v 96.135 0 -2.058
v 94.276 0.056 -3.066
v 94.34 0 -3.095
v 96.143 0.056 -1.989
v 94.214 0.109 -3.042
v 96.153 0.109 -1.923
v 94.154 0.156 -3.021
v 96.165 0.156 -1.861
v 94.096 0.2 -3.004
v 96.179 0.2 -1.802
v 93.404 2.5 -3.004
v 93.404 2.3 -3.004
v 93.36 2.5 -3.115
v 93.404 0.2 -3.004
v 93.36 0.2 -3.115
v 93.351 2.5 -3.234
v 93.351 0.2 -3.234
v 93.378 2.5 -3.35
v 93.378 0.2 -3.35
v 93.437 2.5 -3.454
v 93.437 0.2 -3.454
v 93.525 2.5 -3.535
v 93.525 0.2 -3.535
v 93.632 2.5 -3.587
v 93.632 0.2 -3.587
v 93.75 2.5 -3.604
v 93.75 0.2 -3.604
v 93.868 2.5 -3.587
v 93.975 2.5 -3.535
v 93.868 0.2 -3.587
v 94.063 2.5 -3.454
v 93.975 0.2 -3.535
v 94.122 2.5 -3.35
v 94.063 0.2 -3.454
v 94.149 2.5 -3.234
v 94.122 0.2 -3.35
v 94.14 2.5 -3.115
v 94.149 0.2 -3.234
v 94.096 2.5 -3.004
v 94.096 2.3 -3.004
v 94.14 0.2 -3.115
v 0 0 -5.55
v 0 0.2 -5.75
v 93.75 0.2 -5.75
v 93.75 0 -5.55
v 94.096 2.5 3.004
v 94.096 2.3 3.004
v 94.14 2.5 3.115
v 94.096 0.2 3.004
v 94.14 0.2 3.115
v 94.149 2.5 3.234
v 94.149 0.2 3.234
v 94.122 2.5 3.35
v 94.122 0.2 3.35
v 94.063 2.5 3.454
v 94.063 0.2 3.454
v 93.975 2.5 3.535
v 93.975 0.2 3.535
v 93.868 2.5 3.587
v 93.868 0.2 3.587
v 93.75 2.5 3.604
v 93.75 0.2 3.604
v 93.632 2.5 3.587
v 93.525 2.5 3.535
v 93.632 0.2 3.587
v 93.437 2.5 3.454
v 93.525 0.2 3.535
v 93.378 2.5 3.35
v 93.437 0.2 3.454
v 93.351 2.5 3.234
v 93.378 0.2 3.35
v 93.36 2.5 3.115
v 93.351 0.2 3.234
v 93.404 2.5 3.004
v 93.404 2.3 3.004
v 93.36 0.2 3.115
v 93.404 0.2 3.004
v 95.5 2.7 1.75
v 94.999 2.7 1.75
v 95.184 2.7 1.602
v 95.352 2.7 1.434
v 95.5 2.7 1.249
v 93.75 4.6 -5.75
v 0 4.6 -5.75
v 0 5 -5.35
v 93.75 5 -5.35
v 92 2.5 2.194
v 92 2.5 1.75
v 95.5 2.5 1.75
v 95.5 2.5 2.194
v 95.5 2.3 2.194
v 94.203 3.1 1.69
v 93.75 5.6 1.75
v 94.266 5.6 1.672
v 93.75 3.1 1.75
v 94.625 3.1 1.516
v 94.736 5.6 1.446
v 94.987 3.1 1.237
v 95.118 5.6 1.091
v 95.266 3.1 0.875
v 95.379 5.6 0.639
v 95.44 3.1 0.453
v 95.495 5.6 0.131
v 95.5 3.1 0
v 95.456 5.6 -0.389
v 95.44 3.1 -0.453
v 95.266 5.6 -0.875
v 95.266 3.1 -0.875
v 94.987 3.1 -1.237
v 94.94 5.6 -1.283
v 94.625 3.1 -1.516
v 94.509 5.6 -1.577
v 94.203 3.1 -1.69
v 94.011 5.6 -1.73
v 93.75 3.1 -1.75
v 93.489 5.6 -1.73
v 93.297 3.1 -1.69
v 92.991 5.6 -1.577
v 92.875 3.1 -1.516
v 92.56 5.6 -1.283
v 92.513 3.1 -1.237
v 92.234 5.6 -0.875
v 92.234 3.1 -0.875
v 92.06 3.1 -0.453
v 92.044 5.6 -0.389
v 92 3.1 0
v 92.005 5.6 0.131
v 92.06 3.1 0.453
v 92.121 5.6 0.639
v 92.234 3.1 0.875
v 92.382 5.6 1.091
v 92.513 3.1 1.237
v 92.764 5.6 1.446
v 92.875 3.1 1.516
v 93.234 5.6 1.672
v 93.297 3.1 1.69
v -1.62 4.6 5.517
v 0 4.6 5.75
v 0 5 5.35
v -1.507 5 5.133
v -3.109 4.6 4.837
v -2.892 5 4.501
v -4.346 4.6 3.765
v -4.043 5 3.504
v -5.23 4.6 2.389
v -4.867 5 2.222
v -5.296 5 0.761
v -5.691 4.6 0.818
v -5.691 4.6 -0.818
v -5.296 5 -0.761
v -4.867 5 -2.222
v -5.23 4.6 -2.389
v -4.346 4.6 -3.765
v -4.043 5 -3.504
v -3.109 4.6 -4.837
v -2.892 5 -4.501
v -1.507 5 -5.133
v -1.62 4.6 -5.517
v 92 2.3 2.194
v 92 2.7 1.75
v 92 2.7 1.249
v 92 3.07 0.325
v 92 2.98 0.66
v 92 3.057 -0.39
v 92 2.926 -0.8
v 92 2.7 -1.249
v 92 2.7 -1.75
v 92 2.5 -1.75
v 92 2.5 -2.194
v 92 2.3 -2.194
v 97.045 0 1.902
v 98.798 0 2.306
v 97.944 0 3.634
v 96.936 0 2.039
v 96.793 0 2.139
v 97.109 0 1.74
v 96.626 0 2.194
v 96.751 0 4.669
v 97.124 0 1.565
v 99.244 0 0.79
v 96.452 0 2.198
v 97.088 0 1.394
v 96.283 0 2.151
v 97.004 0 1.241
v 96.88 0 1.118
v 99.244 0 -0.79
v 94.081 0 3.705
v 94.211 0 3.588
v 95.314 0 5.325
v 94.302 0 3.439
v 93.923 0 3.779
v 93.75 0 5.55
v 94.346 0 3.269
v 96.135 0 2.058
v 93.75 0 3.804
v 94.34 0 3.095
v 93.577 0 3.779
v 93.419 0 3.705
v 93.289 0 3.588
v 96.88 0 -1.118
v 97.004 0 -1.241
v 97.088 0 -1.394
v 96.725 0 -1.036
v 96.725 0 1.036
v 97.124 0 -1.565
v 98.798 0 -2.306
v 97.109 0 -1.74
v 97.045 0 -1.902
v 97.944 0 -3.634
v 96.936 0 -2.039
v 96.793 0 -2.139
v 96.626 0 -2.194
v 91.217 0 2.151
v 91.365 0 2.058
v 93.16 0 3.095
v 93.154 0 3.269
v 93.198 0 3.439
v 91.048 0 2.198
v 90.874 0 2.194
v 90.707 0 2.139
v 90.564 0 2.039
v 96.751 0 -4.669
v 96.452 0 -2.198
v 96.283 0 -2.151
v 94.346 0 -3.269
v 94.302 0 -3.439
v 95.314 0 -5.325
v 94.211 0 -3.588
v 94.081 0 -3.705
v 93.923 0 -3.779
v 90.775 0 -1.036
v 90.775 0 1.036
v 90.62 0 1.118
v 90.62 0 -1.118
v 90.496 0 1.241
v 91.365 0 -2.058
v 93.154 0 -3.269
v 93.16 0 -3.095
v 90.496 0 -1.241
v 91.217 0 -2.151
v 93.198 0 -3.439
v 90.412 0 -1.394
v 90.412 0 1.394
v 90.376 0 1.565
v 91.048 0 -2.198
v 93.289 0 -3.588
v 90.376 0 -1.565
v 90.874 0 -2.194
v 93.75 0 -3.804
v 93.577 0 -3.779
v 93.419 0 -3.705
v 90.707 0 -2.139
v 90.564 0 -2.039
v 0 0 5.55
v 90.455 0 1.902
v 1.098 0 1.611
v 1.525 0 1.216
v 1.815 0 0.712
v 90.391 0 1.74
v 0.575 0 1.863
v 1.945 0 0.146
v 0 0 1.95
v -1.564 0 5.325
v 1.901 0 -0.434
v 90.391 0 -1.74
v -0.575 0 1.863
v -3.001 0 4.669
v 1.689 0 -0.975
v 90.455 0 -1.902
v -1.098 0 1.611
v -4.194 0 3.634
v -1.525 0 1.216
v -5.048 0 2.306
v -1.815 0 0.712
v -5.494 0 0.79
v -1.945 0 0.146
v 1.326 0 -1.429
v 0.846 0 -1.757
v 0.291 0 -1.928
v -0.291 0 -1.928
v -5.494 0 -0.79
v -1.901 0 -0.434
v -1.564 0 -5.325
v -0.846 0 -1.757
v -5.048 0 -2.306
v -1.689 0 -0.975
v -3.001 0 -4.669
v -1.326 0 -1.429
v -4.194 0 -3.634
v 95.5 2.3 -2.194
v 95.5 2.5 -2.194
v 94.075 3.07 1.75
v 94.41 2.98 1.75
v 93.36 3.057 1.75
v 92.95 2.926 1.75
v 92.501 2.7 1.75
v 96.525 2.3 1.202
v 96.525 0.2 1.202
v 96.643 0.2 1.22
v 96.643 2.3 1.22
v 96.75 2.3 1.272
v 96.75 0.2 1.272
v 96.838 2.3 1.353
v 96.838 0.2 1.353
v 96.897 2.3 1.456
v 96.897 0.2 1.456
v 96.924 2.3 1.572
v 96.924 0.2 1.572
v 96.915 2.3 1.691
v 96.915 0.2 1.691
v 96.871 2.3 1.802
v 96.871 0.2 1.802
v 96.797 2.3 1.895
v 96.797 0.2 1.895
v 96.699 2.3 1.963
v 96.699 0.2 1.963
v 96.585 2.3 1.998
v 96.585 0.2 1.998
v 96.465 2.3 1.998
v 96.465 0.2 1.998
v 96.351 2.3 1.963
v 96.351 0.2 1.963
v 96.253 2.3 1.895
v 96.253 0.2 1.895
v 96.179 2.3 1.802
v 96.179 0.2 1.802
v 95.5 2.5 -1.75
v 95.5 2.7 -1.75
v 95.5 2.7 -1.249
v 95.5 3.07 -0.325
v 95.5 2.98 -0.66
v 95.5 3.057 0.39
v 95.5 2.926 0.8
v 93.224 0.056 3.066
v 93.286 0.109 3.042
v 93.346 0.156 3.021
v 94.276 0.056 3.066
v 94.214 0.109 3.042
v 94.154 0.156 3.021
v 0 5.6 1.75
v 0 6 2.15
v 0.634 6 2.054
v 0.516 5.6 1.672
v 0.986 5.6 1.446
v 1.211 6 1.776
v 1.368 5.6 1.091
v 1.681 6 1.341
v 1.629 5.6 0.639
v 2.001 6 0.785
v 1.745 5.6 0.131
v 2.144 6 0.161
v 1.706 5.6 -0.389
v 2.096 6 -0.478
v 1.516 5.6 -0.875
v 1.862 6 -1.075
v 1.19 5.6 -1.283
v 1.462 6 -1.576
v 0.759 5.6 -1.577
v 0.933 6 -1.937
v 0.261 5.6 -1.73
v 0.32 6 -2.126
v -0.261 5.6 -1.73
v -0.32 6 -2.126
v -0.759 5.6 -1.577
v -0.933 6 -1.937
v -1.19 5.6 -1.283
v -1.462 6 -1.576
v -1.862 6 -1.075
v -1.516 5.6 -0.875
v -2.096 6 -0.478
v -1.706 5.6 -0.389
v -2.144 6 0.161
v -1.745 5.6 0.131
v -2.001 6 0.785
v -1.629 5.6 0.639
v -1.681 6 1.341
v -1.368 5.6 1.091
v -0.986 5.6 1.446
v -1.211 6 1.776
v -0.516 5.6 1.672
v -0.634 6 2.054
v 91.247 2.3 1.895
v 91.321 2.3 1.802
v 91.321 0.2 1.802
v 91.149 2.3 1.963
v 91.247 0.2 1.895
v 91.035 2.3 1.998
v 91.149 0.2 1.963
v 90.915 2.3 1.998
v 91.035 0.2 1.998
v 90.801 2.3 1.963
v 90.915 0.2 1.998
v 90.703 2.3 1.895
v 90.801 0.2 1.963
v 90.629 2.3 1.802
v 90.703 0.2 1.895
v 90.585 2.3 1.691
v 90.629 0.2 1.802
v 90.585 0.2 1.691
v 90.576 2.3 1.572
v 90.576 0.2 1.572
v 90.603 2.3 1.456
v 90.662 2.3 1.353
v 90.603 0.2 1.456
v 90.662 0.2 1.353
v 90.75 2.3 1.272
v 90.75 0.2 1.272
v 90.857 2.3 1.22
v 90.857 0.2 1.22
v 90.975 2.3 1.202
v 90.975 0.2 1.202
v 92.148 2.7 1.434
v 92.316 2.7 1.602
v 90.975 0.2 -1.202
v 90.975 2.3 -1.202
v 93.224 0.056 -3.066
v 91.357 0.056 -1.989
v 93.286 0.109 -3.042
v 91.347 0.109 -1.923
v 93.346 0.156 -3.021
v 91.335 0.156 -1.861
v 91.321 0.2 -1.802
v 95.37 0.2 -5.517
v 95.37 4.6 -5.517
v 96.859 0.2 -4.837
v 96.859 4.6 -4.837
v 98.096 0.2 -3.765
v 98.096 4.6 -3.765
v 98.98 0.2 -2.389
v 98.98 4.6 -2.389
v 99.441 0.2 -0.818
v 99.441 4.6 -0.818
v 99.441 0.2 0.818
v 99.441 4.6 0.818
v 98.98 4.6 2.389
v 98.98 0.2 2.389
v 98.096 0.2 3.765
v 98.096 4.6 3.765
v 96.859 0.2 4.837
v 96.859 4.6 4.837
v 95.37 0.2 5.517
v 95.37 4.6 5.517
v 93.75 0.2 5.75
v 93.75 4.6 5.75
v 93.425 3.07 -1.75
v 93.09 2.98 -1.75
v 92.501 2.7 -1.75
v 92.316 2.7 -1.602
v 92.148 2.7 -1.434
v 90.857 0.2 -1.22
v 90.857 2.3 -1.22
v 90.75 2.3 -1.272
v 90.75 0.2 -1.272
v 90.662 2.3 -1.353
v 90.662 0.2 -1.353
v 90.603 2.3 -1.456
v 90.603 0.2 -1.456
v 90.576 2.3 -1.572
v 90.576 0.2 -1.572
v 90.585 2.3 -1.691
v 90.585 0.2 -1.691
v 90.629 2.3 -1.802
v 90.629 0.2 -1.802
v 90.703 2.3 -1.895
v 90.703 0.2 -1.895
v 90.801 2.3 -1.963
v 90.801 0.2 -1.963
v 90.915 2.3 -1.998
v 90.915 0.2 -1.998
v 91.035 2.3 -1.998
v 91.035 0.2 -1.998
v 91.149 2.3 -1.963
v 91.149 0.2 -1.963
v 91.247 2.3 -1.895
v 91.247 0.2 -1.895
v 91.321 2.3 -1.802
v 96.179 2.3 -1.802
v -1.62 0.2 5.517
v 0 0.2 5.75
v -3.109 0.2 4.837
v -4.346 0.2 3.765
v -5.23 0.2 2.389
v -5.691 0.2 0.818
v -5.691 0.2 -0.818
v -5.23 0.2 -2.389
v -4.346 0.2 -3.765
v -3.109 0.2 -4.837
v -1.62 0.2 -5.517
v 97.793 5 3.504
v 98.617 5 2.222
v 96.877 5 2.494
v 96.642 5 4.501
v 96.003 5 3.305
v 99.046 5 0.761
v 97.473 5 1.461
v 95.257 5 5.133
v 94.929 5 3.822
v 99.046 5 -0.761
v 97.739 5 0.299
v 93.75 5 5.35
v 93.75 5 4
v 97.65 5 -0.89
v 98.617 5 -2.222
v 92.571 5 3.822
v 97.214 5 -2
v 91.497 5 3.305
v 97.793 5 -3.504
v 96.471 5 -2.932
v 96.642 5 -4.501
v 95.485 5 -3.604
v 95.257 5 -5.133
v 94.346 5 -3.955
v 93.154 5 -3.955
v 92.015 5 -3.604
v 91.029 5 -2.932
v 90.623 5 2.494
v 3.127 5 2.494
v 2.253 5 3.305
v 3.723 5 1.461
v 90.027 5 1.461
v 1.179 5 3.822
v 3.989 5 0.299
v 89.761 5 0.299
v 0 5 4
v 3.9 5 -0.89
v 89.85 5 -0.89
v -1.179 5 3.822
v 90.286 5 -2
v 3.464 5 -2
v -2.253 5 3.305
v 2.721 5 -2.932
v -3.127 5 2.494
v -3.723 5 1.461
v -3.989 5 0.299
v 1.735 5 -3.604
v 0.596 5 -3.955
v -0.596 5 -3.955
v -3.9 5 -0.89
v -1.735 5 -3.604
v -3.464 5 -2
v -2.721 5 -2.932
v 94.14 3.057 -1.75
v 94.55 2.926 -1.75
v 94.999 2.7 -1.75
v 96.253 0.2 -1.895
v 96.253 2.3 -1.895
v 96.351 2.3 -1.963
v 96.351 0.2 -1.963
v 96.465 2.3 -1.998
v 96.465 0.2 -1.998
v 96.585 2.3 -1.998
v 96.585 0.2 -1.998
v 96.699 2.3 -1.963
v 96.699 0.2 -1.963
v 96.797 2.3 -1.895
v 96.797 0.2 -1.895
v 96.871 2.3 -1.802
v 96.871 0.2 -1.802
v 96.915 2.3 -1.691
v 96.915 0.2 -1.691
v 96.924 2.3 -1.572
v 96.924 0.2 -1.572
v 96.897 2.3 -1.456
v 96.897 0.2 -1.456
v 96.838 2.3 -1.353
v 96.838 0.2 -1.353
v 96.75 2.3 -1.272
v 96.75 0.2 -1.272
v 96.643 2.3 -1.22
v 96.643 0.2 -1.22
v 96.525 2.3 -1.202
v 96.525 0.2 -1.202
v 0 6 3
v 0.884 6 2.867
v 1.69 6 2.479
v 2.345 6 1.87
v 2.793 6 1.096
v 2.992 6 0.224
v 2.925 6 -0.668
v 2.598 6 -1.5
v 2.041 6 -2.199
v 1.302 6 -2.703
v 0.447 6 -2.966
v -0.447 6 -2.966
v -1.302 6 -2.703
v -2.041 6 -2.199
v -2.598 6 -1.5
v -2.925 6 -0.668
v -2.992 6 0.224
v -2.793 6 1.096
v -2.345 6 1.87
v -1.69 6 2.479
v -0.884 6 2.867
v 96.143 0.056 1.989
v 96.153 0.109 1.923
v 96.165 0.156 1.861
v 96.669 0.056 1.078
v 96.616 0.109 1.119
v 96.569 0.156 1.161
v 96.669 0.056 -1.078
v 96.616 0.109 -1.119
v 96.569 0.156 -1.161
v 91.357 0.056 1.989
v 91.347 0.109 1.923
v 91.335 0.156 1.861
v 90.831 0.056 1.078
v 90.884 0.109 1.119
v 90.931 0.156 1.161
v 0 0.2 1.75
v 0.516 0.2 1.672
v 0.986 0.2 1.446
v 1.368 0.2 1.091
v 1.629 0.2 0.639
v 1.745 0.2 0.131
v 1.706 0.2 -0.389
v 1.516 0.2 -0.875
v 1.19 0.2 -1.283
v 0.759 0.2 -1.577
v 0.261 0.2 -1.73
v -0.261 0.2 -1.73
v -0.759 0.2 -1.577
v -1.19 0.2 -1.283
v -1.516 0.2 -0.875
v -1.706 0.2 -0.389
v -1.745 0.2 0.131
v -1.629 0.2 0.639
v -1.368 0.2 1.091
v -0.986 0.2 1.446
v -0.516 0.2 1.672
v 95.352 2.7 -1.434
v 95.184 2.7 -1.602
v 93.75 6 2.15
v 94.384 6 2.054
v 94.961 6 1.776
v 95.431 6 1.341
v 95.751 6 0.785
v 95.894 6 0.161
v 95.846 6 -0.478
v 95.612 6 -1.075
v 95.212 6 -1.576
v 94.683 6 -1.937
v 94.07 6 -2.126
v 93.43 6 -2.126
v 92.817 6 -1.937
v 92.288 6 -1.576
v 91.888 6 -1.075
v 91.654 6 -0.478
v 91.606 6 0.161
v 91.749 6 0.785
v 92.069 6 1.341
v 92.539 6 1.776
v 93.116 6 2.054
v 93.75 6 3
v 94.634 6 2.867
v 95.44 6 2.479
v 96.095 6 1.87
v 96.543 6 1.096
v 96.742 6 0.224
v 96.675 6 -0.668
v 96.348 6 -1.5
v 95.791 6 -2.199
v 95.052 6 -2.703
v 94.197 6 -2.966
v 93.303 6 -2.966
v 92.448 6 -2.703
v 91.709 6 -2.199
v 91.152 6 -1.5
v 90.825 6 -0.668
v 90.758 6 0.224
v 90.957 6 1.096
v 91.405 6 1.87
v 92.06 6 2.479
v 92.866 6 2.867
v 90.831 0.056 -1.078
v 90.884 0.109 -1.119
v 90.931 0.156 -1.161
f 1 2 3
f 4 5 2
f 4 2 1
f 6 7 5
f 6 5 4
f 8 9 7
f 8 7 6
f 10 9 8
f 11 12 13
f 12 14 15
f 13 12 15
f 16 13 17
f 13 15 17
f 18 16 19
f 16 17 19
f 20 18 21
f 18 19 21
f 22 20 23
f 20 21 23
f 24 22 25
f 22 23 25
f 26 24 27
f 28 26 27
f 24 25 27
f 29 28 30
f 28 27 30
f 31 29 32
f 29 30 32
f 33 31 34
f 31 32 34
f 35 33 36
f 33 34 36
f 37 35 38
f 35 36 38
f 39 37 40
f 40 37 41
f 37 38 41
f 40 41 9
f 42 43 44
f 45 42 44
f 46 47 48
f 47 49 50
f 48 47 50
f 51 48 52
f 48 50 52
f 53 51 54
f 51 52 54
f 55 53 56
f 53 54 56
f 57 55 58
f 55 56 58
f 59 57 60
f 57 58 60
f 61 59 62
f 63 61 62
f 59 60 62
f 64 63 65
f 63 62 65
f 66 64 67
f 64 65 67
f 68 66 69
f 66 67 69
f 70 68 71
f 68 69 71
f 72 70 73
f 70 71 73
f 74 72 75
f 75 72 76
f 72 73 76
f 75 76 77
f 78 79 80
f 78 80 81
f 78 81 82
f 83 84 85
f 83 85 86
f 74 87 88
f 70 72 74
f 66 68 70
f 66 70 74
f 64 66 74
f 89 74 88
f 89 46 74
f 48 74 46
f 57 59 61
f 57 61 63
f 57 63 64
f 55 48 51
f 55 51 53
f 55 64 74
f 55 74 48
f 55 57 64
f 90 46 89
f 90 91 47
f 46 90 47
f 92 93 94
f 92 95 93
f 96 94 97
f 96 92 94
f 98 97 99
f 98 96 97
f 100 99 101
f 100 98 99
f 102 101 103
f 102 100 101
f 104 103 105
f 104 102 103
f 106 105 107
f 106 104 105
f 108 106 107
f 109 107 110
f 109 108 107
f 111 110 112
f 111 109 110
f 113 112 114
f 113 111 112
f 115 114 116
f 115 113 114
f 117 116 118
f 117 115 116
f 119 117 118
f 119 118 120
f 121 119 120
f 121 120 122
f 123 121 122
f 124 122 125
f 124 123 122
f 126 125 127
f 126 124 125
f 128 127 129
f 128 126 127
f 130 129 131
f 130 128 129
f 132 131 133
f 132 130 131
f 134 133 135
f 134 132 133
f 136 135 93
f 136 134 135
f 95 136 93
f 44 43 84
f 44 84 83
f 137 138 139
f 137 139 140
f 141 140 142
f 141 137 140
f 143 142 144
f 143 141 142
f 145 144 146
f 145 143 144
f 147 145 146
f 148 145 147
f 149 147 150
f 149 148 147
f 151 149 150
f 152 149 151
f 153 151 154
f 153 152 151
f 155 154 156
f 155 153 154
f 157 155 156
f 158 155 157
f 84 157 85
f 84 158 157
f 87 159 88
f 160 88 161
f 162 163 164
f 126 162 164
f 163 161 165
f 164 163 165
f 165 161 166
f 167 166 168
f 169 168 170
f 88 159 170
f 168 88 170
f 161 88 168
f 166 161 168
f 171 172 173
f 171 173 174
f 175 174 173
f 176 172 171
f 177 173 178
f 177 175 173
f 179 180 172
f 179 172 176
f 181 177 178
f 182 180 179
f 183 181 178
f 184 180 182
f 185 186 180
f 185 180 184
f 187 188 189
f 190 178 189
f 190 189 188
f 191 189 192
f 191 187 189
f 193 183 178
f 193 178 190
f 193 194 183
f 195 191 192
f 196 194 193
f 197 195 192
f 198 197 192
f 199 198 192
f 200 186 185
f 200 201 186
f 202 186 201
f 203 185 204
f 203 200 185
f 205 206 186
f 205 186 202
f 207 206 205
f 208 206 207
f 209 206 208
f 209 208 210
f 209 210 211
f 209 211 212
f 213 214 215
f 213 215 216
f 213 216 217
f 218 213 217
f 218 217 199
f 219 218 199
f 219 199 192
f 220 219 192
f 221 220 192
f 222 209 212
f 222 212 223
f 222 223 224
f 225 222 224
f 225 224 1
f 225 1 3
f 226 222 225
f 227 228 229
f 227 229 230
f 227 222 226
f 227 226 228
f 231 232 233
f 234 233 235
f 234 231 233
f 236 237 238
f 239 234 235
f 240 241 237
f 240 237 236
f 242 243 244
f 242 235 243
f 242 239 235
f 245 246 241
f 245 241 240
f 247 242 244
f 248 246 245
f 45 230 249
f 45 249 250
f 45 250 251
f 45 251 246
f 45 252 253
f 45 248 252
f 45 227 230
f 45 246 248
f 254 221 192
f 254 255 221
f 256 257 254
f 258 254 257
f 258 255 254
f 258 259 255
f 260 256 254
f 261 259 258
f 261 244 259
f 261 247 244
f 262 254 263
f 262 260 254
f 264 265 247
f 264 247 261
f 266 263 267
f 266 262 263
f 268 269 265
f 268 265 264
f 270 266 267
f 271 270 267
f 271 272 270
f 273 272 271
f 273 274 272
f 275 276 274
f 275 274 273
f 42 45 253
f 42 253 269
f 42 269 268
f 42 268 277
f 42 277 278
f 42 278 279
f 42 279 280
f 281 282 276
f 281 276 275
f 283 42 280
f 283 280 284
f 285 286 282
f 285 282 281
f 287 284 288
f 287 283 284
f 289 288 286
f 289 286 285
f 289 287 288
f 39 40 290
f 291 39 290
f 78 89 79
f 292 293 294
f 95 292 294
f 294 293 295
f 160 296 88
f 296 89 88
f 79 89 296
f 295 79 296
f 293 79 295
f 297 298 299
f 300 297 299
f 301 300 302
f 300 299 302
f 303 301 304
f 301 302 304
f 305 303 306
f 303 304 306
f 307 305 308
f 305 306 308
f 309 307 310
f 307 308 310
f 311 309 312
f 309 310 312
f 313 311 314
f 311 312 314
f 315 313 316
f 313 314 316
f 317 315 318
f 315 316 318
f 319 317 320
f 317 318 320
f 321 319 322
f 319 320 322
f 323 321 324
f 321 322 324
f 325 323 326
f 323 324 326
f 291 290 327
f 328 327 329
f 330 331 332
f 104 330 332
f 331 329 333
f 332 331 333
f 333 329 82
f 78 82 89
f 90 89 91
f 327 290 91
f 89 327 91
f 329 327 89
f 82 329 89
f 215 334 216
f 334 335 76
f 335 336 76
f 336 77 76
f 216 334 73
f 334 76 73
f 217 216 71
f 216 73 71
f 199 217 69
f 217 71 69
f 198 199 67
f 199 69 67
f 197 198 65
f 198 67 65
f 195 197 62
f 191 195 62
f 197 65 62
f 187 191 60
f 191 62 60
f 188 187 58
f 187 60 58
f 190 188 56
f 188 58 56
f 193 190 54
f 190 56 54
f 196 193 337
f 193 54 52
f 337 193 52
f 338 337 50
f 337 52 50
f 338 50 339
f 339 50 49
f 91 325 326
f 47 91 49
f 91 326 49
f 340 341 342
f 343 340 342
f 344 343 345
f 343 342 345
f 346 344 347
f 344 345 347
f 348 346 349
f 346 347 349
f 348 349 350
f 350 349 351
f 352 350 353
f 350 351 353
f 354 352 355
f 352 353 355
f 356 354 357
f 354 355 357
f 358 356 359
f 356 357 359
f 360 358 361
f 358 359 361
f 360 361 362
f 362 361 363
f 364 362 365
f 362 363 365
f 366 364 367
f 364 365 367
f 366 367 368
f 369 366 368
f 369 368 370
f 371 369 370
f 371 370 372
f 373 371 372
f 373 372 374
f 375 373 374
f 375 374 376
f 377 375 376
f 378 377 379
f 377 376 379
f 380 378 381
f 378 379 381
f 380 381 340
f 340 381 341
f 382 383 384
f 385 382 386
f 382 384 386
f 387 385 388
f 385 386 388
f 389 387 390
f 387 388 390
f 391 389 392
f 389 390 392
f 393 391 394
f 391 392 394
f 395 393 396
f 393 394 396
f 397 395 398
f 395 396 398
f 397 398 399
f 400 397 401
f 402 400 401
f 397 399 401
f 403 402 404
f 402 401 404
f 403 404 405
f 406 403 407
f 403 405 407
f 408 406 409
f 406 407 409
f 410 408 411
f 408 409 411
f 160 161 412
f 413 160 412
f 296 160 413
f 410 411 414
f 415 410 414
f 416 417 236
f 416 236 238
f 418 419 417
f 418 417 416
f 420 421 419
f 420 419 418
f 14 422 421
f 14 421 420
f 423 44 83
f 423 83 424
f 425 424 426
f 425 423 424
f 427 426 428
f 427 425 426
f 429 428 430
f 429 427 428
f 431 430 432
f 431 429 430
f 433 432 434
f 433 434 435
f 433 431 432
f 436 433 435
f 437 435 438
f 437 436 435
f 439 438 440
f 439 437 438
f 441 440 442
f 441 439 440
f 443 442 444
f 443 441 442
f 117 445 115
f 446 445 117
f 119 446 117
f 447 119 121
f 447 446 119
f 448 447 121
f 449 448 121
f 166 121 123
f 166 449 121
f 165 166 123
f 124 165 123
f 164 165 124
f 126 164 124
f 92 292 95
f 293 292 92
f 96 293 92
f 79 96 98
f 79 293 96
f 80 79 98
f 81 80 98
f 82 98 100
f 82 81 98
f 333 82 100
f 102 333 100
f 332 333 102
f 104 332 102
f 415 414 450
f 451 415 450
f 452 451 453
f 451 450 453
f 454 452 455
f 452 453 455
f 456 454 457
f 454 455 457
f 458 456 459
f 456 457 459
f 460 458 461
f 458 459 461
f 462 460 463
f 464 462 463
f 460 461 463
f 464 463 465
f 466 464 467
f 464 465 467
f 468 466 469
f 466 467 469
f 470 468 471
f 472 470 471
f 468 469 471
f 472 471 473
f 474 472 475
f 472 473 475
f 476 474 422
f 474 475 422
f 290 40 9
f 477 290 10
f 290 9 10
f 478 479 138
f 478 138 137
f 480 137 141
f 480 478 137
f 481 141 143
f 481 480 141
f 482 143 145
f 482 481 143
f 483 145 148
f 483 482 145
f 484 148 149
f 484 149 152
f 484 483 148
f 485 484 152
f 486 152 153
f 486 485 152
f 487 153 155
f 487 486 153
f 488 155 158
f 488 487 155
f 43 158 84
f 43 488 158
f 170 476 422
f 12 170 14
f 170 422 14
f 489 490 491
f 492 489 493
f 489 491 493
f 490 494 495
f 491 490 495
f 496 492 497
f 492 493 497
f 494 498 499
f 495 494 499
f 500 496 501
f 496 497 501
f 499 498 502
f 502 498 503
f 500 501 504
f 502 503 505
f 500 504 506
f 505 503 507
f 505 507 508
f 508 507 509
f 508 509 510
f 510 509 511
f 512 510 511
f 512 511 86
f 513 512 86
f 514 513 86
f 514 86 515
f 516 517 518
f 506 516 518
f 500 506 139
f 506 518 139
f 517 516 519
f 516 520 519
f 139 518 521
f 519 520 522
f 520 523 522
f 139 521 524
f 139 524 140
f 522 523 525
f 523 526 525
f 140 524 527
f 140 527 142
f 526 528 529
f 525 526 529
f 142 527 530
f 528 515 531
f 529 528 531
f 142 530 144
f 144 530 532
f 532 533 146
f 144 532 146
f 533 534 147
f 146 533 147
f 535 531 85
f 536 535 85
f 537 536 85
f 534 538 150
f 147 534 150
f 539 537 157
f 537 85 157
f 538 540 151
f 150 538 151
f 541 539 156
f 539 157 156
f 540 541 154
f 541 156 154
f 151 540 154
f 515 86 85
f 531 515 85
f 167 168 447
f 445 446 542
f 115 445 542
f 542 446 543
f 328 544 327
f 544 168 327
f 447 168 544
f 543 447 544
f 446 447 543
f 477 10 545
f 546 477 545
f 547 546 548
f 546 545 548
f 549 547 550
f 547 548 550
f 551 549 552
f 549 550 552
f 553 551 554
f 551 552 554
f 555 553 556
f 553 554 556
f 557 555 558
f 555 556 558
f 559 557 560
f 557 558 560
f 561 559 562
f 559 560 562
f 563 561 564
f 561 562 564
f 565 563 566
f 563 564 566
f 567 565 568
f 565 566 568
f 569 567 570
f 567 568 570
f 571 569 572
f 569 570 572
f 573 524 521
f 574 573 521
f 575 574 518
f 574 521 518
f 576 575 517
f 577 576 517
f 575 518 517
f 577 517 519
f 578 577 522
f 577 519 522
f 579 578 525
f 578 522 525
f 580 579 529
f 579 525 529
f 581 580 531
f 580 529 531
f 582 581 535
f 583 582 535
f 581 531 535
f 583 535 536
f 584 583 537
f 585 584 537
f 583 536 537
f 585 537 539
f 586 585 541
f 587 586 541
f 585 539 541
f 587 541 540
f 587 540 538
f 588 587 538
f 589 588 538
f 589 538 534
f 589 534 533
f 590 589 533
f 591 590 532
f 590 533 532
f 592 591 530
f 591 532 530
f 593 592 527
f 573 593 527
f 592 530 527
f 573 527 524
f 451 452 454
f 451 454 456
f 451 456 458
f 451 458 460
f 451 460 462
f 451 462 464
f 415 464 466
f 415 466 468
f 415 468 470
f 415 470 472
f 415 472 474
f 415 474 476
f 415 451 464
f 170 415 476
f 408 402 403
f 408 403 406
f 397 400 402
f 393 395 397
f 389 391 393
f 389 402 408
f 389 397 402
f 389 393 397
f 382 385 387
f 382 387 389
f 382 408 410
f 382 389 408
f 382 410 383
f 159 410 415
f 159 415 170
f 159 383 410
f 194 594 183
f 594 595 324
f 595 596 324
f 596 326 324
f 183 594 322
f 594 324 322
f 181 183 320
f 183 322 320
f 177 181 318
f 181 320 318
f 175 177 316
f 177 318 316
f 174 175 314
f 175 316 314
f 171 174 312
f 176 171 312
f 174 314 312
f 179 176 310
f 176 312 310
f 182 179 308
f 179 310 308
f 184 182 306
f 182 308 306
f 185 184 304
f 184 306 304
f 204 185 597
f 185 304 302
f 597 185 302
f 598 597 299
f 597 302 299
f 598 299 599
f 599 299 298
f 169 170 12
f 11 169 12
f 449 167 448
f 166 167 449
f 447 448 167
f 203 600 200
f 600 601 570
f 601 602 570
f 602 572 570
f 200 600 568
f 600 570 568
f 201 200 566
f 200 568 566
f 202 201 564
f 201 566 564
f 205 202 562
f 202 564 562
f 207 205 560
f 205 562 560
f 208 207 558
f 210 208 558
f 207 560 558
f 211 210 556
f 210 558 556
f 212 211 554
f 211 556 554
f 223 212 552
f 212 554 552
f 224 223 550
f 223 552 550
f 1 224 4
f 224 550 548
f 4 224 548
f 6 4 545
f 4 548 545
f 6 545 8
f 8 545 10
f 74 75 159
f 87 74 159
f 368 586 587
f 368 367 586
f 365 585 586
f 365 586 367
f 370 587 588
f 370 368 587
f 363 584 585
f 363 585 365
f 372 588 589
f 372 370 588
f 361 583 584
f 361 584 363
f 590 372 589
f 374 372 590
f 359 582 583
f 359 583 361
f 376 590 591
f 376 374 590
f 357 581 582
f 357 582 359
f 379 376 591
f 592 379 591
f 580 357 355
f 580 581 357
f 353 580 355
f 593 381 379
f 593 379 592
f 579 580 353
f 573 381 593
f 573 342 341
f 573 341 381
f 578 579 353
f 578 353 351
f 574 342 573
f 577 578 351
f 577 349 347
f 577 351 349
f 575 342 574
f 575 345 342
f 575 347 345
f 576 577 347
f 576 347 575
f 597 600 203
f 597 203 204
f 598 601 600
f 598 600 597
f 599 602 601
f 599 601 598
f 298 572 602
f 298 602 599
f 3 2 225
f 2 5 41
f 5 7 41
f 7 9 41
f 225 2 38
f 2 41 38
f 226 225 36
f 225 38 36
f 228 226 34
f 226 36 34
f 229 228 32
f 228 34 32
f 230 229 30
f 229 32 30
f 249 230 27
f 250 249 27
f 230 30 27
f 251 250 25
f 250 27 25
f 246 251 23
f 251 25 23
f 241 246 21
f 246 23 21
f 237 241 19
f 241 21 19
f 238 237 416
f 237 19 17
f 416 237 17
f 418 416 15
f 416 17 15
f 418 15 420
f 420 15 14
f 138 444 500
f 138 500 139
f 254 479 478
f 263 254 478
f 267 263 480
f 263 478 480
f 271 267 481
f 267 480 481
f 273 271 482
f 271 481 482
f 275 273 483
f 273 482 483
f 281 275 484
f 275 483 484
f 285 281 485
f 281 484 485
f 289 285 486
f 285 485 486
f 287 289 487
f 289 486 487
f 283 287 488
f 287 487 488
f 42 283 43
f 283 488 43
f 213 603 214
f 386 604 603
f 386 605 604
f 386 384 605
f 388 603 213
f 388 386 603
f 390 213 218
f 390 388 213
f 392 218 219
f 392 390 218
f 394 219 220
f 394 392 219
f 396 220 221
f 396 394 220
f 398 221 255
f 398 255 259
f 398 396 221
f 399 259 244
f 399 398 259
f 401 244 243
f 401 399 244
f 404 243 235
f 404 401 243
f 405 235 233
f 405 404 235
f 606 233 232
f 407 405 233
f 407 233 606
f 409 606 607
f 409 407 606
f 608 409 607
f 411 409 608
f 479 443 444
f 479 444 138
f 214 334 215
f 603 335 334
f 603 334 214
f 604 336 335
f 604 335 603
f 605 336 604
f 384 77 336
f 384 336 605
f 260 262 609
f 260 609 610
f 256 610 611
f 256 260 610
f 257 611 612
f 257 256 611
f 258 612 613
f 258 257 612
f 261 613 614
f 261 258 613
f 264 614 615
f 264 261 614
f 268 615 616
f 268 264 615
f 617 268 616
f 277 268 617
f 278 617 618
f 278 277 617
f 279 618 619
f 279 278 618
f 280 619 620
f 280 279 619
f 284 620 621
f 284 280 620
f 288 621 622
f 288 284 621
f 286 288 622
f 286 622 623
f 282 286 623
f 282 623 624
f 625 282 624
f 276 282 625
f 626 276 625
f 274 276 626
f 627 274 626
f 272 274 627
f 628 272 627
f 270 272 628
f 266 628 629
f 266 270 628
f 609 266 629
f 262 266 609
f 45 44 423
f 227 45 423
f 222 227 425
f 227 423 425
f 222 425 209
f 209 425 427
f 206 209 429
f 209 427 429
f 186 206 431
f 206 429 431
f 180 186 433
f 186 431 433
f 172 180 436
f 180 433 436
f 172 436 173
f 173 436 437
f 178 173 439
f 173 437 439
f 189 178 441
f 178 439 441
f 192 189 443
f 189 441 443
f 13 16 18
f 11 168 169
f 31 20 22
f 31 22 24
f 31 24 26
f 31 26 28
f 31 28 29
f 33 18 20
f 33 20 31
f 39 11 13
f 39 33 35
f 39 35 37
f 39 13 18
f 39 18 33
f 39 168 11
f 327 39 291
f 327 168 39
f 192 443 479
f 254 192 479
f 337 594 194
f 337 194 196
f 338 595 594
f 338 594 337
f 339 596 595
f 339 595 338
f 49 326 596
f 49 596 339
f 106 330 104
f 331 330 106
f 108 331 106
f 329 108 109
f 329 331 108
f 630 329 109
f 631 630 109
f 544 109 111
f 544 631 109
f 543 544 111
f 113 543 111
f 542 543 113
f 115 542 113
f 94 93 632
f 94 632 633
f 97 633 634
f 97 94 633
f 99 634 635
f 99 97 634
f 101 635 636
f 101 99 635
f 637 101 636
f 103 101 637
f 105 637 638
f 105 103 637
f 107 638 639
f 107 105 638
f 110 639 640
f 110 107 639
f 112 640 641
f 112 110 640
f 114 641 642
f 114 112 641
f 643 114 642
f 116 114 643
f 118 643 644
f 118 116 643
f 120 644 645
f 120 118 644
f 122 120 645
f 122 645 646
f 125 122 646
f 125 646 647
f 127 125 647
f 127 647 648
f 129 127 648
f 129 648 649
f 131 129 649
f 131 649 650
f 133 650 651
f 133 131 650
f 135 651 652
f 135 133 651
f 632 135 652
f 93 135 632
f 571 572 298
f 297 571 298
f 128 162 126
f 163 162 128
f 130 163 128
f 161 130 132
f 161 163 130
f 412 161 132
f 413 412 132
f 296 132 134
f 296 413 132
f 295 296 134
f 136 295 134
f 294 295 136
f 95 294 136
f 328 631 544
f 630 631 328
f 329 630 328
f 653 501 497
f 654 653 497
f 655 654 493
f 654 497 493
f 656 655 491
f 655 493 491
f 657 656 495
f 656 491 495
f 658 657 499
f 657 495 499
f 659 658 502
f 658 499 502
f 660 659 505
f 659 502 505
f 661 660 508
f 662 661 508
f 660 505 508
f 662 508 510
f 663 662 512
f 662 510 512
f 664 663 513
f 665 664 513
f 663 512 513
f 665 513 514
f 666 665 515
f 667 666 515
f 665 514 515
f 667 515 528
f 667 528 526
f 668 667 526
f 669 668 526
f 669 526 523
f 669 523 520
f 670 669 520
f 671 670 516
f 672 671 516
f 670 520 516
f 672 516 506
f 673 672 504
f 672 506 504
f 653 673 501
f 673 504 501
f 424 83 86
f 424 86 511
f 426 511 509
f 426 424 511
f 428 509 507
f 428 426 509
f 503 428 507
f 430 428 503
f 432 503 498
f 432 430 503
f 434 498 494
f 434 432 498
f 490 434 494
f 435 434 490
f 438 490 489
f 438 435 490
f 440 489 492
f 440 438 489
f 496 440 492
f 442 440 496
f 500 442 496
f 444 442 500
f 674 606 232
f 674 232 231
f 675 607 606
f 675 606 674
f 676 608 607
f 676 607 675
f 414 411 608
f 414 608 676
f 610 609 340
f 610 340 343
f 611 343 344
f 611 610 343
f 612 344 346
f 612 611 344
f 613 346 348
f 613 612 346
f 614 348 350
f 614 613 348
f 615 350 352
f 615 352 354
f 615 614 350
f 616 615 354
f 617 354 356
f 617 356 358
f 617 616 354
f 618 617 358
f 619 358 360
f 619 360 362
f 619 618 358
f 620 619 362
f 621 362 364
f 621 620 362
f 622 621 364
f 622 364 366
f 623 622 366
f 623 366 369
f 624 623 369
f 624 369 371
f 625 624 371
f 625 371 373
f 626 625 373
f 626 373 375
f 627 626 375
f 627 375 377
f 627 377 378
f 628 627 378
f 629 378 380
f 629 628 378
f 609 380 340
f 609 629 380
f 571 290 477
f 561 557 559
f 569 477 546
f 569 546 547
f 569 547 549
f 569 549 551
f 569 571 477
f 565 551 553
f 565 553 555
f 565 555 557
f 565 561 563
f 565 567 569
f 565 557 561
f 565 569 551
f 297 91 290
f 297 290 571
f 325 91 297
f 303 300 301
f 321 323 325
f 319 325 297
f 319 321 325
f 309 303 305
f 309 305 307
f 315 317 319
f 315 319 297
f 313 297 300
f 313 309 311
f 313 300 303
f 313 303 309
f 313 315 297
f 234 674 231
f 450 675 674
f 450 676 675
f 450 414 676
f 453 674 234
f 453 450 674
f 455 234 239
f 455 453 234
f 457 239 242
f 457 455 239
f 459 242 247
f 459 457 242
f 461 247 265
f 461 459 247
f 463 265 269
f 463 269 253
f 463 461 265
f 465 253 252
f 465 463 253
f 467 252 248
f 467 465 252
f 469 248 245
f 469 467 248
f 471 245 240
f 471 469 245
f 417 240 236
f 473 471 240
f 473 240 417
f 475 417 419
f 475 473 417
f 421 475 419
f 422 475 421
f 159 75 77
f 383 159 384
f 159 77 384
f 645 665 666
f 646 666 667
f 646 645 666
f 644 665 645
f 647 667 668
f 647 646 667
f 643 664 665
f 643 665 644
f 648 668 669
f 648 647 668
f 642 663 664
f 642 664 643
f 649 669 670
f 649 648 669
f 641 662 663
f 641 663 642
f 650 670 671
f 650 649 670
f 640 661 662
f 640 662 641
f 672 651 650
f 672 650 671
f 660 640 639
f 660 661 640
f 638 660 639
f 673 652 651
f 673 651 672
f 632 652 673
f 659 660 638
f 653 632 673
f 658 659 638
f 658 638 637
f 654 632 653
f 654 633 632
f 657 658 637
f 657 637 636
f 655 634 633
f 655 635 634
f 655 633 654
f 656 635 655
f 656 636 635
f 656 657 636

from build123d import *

# Parameters (mm, degrees)
CROQUIS2_R              = 1.75
SALIENTE_EXTRUIR1_DEPTH = 5
CROQUIS3_R              = 3
CROQUIS3_R_2            = 1.75
SALIENTE_EXTRUIR2_DEPTH = 1
CHAFL_N1_SIZE           = 1
CHAFL_N2_SIZE           = 0.4
CROQUIS4_R              = 0.4
CROQUIS4_R_2            = 1.75
CORTAR_EXTRUIR1_DEPTH   = 2.3
CHAFL_N3_SIZE           = 0.2
CORTAR_EXTRUIR2_DEPTH   = 0.2
CORTAR_EXTRUIR3_DEPTH   = 0.2
CHAFL_N4_SIZE           = 0.4


# Some blends are built 0.0001 mm under size
with BuildPart() as part:
    # Croquis2 → Saliente-Extruir1 (new body)
    with BuildSketch(Plane(origin=(0, 0, 0), x_dir=(1, 0, 0), z_dir=(0, 1, 0))):
        with BuildLine():
            Line((0, 5.75), (93.75, 5.75))
            ThreePointArc((93.75, 5.75), (99.5, 0), (93.75, -5.75))
            Line((93.75, -5.75), (0, -5.75))
            ThreePointArc((0, -5.75), (-5.75, 0), (0, 5.75))
        make_face()
        with Locations(Location((93.75, 0, 0), (0, 0, 270))):
            Circle(CROQUIS2_R, mode=Mode.SUBTRACT)
        with Locations(Location((0, 0, 0), (0, 0, 270))):
            Circle(CROQUIS2_R, mode=Mode.SUBTRACT)
    extrude(amount=SALIENTE_EXTRUIR1_DEPTH)

    # Croquis3 → Saliente-Extruir2 (add)
    # profile 1 of 2: a face of its own
    with BuildSketch(Plane(origin=(0, 5, 0), x_dir=(1, 0, 0), z_dir=(0, 1, 0))):
        with Locations(Location((93.75, 0, 0), (0, 0, 270))):
            Circle(CROQUIS3_R)
        with Locations(Location((93.75, 0, 0), (0, 0, 270))):
            Circle(CROQUIS3_R_2, mode=Mode.SUBTRACT)
    # profile 2 of 2: a face of its own
    with BuildSketch(Plane(origin=(0, 5, 0), x_dir=(1, 0, 0), z_dir=(0, 1, 0))):
        with Locations(Location((0, 0, 0), (0, 0, 270))):
            Circle(CROQUIS3_R)
        with Locations(Location((0, 0, 0), (0, 0, 270))):
            Circle(CROQUIS3_R_2, mode=Mode.SUBTRACT)
    extrude(amount=SALIENTE_EXTRUIR2_DEPTH)

    # Chaflán1
    chafl_n1_edges = [part.edges().sort_by_distance(p)[0] for p in [
        (93.75, 5, -3),
        (0, 5, -3),
    ]]
    chamfer(chafl_n1_edges, length=CHAFL_N1_SIZE - 0.0001)  # a hair under: the kernel refuses the full size

    # Chaflán2
    chafl_n2_edges = [part.edges().sort_by_distance(p)[0] for p in [
        (46.875, 5, 5.75),
        (99.5, 5, 0),
        (93.75, 6, -1.75),
        (46.875, 5, -5.75),
        (0, 6, -1.75),
        (-5.75, 5, 0),
    ]]
    chamfer(chafl_n2_edges, length=CHAFL_N2_SIZE)

    # Croquis4 → Cortar-Extruir1 (cut)
    # profile 1 of 31: a face of its own
    with BuildSketch(Plane.XZ):
        with Locations((90.975, 1.602146997)):
            Circle(CROQUIS4_R)
    # profile 2 of 31: a face of its own
    with BuildSketch(Plane.XZ):
        with Locations((90.975, -1.602146997)):
            Circle(CROQUIS4_R)
    # profile 3 of 31: a face of its own
    with BuildSketch(Plane.XZ):
        with Locations((93.75, -3.204293994)):
            Circle(CROQUIS4_R)
    # profile 4 of 31: a face of its own
    with BuildSketch(Plane.XZ):
        with Locations((96.525, -1.602146997)):
            Circle(CROQUIS4_R)
    # profile 5 of 31: a face of its own
    with BuildSketch(Plane.XZ):
        with Locations((96.525, 1.602146997)):
            Circle(CROQUIS4_R)
    # profile 6 of 31: a face of its own
    with BuildSketch(Plane.XZ):
        with Locations((93.75, 3.204293994)):
            Circle(CROQUIS4_R)
    # profile 7 of 31: a face of its own
    with BuildSketch(Plane.XZ):
        Polygon((90.975, 1.602146997), (90.975, -1.602146997), (93.75, -3.204293994), (96.525, -1.602146997), (96.525, 1.602146997), (93.75, 3.204293994), align=None)
        with Locations(Location((93.75, 0, 0), (0, 0, 270))):
            Circle(CROQUIS4_R_2, mode=Mode.SUBTRACT)
    # profile 8 of 31: a face of its own
    with BuildSketch(Plane.XZ):
        with BuildLine():
            Line((94.096410162, 3.004293994), (93.75, 3.204293994))
            Line((93.75, 3.204293994), (93.403589838, 3.004293994))
            ThreePointArc((93.403589838, 3.004293994), (93.75, 2.804293994), (94.096410162, 3.004293994))
        make_face()
    # profile 9 of 31: a face of its own
    with BuildSketch(Plane.XZ):
        with BuildLine():
            Line((93.403589838, 3.004293994), (93.75, 3.204293994))
            Line((93.75, 3.204293994), (94.096410162, 3.004293994))
            ThreePointArc((94.096410162, 3.004293994), (94.136370331, 3.100766376), (94.15, 3.204293994))
            ThreePointArc((94.15, 3.204293994), (93.646472382, 3.590664325), (93.403589838, 3.004293994))
        make_face()
    # profile 10 of 31: a face of its own
    with BuildSketch(Plane.XZ):
        with BuildLine():
            Line((94.096410162, 3.004293994), (93.75, 3.204293994))
            Line((93.75, 3.204293994), (93.403589838, 3.004293994))
            ThreePointArc((93.403589838, 3.004293994), (93.75, 2.804293994), (94.096410162, 3.004293994))
        make_face()
    # profile 11 of 31: a face of its own
    with BuildSketch(Plane.XZ):
        with BuildLine():
            Line((93.403589838, 3.004293994), (93.75, 3.204293994))
            Line((93.75, 3.204293994), (94.096410162, 3.004293994))
            ThreePointArc((94.096410162, 3.004293994), (94.136370331, 3.100766376), (94.15, 3.204293994))
            ThreePointArc((94.15, 3.204293994), (93.646472382, 3.590664325), (93.403589838, 3.004293994))
        make_face()
    # profile 12 of 31: a face of its own
    with BuildSketch(Plane.XZ):
        with BuildLine():
            ThreePointArc((96.925, 1.602146997), (96.628527618, 1.988517328), (96.178589838, 1.802146997))
            Line((96.178589838, 1.802146997), (96.525, 1.602146997))
            Line((96.525, 1.602146997), (96.525, 1.202146997))
            ThreePointArc((96.525, 1.202146997), (96.807842712, 1.319304285), (96.925, 1.602146997))
        make_face()
    # profile 13 of 31: a face of its own
    with BuildSketch(Plane.XZ):
        with BuildLine():
            Line((96.525, 1.602146997), (96.178589838, 1.802146997))
            ThreePointArc((96.178589838, 1.802146997), (96.178589838, 1.402146997), (96.525, 1.202146997))
            Line((96.525, 1.202146997), (96.525, 1.602146997))
        make_face()
    # profile 14 of 31: a face of its own
    with BuildSketch(Plane.XZ):
        with BuildLine():
            ThreePointArc((96.925, 1.602146997), (96.628527618, 1.988517328), (96.178589838, 1.802146997))
            Line((96.178589838, 1.802146997), (96.525, 1.602146997))
            Line((96.525, 1.602146997), (96.525, 1.202146997))
            ThreePointArc((96.525, 1.202146997), (96.807842712, 1.319304285), (96.925, 1.602146997))
        make_face()
    # profile 15 of 31: a face of its own
    with BuildSketch(Plane.XZ):
        with BuildLine():
            Line((96.525, 1.602146997), (96.178589838, 1.802146997))
            ThreePointArc((96.178589838, 1.802146997), (96.178589838, 1.402146997), (96.525, 1.202146997))
            Line((96.525, 1.202146997), (96.525, 1.602146997))
        make_face()
    # profile 16 of 31: a face of its own
    with BuildSketch(Plane.XZ):
        with BuildLine():
            ThreePointArc((96.925, -1.602146997), (96.807842712, -1.319304285), (96.525, -1.202146997))
            Line((96.525, -1.202146997), (96.525, -1.602146997))
            Line((96.525, -1.602146997), (96.178589838, -1.802146997))
            ThreePointArc((96.178589838, -1.802146997), (96.628527618, -1.988517328), (96.925, -1.602146997))
        make_face()
    # profile 17 of 31: a face of its own
    with BuildSketch(Plane.XZ):
        with BuildLine():
            Line((96.525, -1.602146997), (96.525, -1.202146997))
            ThreePointArc((96.525, -1.202146997), (96.178589838, -1.402146997), (96.178589838, -1.802146997))
            Line((96.178589838, -1.802146997), (96.525, -1.602146997))
        make_face()
    # profile 18 of 31: a face of its own
    with BuildSketch(Plane.XZ):
        with BuildLine():
            ThreePointArc((96.925, -1.602146997), (96.807842712, -1.319304285), (96.525, -1.202146997))
            Line((96.525, -1.202146997), (96.525, -1.602146997))
            Line((96.525, -1.602146997), (96.178589838, -1.802146997))
            ThreePointArc((96.178589838, -1.802146997), (96.628527618, -1.988517328), (96.925, -1.602146997))
        make_face()
    # profile 19 of 31: a face of its own
    with BuildSketch(Plane.XZ):
        with BuildLine():
            Line((96.525, -1.602146997), (96.525, -1.202146997))
            ThreePointArc((96.525, -1.202146997), (96.178589838, -1.402146997), (96.178589838, -1.802146997))
            Line((96.178589838, -1.802146997), (96.525, -1.602146997))
        make_face()
    # profile 20 of 31: a face of its own
    with BuildSketch(Plane.XZ):
        with BuildLine():
            ThreePointArc((94.096410162, -3.004293994), (93.75, -2.804293994), (93.403589838, -3.004293994))
            Line((93.403589838, -3.004293994), (93.75, -3.204293994))
            Line((93.75, -3.204293994), (94.096410162, -3.004293994))
        make_face()
    # profile 21 of 31: a face of its own
    with BuildSketch(Plane.XZ):
        with BuildLine():
            Line((93.75, -3.204293994), (93.403589838, -3.004293994))
            ThreePointArc((93.403589838, -3.004293994), (93.646472382, -3.590664325), (94.15, -3.204293994))
            ThreePointArc((94.15, -3.204293994), (94.136370331, -3.100766376), (94.096410162, -3.004293994))
            Line((94.096410162, -3.004293994), (93.75, -3.204293994))
        make_face()
    # profile 22 of 31: a face of its own
    with BuildSketch(Plane.XZ):
        with BuildLine():
            ThreePointArc((94.096410162, -3.004293994), (93.75, -2.804293994), (93.403589838, -3.004293994))
            Line((93.403589838, -3.004293994), (93.75, -3.204293994))
            Line((93.75, -3.204293994), (94.096410162, -3.004293994))
        make_face()
    # profile 23 of 31: a face of its own
    with BuildSketch(Plane.XZ):
        with BuildLine():
            Line((93.75, -3.204293994), (93.403589838, -3.004293994))
            ThreePointArc((93.403589838, -3.004293994), (93.646472382, -3.590664325), (94.15, -3.204293994))
            ThreePointArc((94.15, -3.204293994), (94.136370331, -3.100766376), (94.096410162, -3.004293994))
            Line((94.096410162, -3.004293994), (93.75, -3.204293994))
        make_face()
    # profile 24 of 31: a face of its own
    with BuildSketch(Plane.XZ):
        with BuildLine():
            ThreePointArc((91.375, -1.602146997), (91.257842712, -1.319304285), (90.975, -1.202146997))
            Line((90.975, -1.202146997), (90.975, -1.602146997))
            Line((90.975, -1.602146997), (91.321410162, -1.802146997))
            ThreePointArc((91.321410162, -1.802146997), (91.361370331, -1.705674615), (91.375, -1.602146997))
        make_face()
    # profile 25 of 31: a face of its own
    with BuildSketch(Plane.XZ):
        with BuildLine():
            Line((90.975, -1.602146997), (90.975, -1.202146997))
            ThreePointArc((90.975, -1.202146997), (90.628589838, -1.802146997), (91.321410162, -1.802146997))
            Line((91.321410162, -1.802146997), (90.975, -1.602146997))
        make_face()
    # profile 26 of 31: a face of its own
    with BuildSketch(Plane.XZ):
        with BuildLine():
            ThreePointArc((91.375, -1.602146997), (91.257842712, -1.319304285), (90.975, -1.202146997))
            Line((90.975, -1.202146997), (90.975, -1.602146997))
            Line((90.975, -1.602146997), (91.321410162, -1.802146997))
            ThreePointArc((91.321410162, -1.802146997), (91.361370331, -1.705674615), (91.375, -1.602146997))
        make_face()
    # profile 27 of 31: a face of its own
    with BuildSketch(Plane.XZ):
        with BuildLine():
            Line((90.975, -1.602146997), (90.975, -1.202146997))
            ThreePointArc((90.975, -1.202146997), (90.628589838, -1.802146997), (91.321410162, -1.802146997))
            Line((91.321410162, -1.802146997), (90.975, -1.602146997))
        make_face()
    # profile 28 of 31: a face of its own
    with BuildSketch(Plane.XZ):
        with BuildLine():
            ThreePointArc((91.375, 1.602146997), (91.361370331, 1.705674615), (91.321410162, 1.802146997))
            Line((91.321410162, 1.802146997), (90.975, 1.602146997))
            Line((90.975, 1.602146997), (90.975, 1.202146997))
            ThreePointArc((90.975, 1.202146997), (91.257842712, 1.319304285), (91.375, 1.602146997))
        make_face()
    # profile 29 of 31: a face of its own
    with BuildSketch(Plane.XZ):
        with BuildLine():
            Line((90.975, 1.602146997), (91.321410162, 1.802146997))
            ThreePointArc((91.321410162, 1.802146997), (90.628589838, 1.802146997), (90.975, 1.202146997))
            Line((90.975, 1.202146997), (90.975, 1.602146997))
        make_face()
    # profile 30 of 31: a face of its own
    with BuildSketch(Plane.XZ):
        with BuildLine():
            ThreePointArc((91.375, 1.602146997), (91.361370331, 1.705674615), (91.321410162, 1.802146997))
            Line((91.321410162, 1.802146997), (90.975, 1.602146997))
            Line((90.975, 1.602146997), (90.975, 1.202146997))
            ThreePointArc((90.975, 1.202146997), (91.257842712, 1.319304285), (91.375, 1.602146997))
        make_face()
    # profile 31 of 31: a face of its own
    with BuildSketch(Plane.XZ):
        with BuildLine():
            Line((90.975, 1.602146997), (91.321410162, 1.802146997))
            ThreePointArc((91.321410162, 1.802146997), (90.628589838, 1.802146997), (90.975, 1.202146997))
            Line((90.975, 1.202146997), (90.975, 1.602146997))
        make_face()
    extrude(amount=-CORTAR_EXTRUIR1_DEPTH, mode=Mode.SUBTRACT)

    # Chaflán3
    chafl_n3_edges = [part.edges().sort_by_distance(p)[0] for p in [
        (0, 0, -1.75),
        (90.628589838, 0, 1.802146997),
        (90.975, 0, 0),
        (90.628589838, 0, -1.802146997),
        (92.3625, 0, -2.403220496),
        (93.75, 0, -3.604293994),
        (95.1375, 0, -2.403220496),
        (96.871410162, 0, -1.802146997),
        (96.525, 0, 0),
        (96.871410162, 0, 1.802146997),
        (95.1375, 0, 2.403220496),
        (93.75, 0, 3.604293994),
        (92.3625, 0, 2.403220496),
        (-5.75, 0, 0),
        (46.875, 0, -5.75),
        (99.5, 0, 0),
        (46.875, 0, 5.75),
    ]]
    chamfer(chafl_n3_edges, length=CHAFL_N3_SIZE)

    # Croquis5 → Cortar-Extruir2 (cut)
    with BuildSketch(Plane.XZ.offset(-2.3)):
        with BuildLine():
            Line((93.403589838, 3.004293994), (92, 2.193931023))
            Line((92, 2.193931023), (92, 0))
            ThreePointArc((92, 0), (93.75, 1.75), (95.5, 0))
            Line((95.5, 0), (95.5, 2.193931023))
            Line((95.5, 2.193931023), (94.096410162, 3.004293994))
            ThreePointArc((94.096410162, 3.004293994), (93.75, 3.604293994), (93.403589838, 3.004293994))
        make_face()
        with BuildLine():
            ThreePointArc((95.5, 0), (93.75, -1.75), (92, 0))
            Line((92, 0), (92, -2.193931023))
            Line((92, -2.193931023), (93.403589838, -3.004293994))
            ThreePointArc((93.403589838, -3.004293994), (93.75, -3.604293994), (94.096410162, -3.004293994))
            Line((94.096410162, -3.004293994), (95.5, -2.193931023))
            Line((95.5, -2.193931023), (95.5, 0))
        make_face()
    extrude(amount=-CORTAR_EXTRUIR2_DEPTH, mode=Mode.SUBTRACT)

    # Croquis6 → Cortar-Extruir3 (cut)
    with BuildSketch(Plane.XZ.offset(-2.5)):
        with BuildLine():
            Line((93.75, 1.75), (92, 1.75))
            Line((92, 1.75), (92, 0))
            ThreePointArc((92, 0), (92.512563133, 1.237436867), (93.75, 1.75))
        make_face()
        with BuildLine():
            Line((95.5, 1.75), (93.75, 1.75))
            ThreePointArc((93.75, 1.75), (94.987436867, 1.237436867), (95.5, 0))
            Line((95.5, 0), (95.5, 1.75))
        make_face()
        with BuildLine():
            Line((95.5, -1.75), (95.5, 0))
            ThreePointArc((95.5, 0), (94.987436866, -1.237436868), (93.749999997, -1.75))
            Line((93.749999997, -1.75), (95.5, -1.75))
        make_face()
        with BuildLine():
            ThreePointArc((93.749999997, -1.75), (92.512563132, -1.237436866), (92, 0))
            Line((92, 0), (92, -1.75))
            Line((92, -1.75), (93.749999997, -1.75))
        make_face()
    extrude(amount=-CORTAR_EXTRUIR3_DEPTH, mode=Mode.SUBTRACT)

    # Chaflán4
    # the kernel refuses this chamfer: 0.4 mm, written as the material it takes off along each edge
    with BuildSketch(Plane(origin=(93.75, 2.7, 0), x_dir=(1, 0, 0), z_dir=(0, 0, 1))) as chafl_n4_piece_1_section:
        Polygon((1.75, CHAFL_N4_SIZE), (1.75 + CHAFL_N4_SIZE, 0), (1.75, 0), align=None)
    chafl_n4_piece_1 = revolve(axis=Axis((93.75, 2.7, 0), (0, 1, 0)), revolution_arc=90.000000086, mode=Mode.PRIVATE)
    chafl_n4_piece_1 = split(chafl_n4_piece_1, bisect_by=Plane(origin=(95.5, 2.845713539, -1.262575897), z_dir=(-1, 0, 0)), keep=Keep.TOP, mode=Mode.PRIVATE)
    chafl_n4_piece_1 = split(chafl_n4_piece_1, bisect_by=Plane(origin=(95.012575897, 2.845713539, -1.75), z_dir=(0, 0, 1)), keep=Keep.TOP, mode=Mode.PRIVATE)
    add(chafl_n4_piece_1, mode=Mode.SUBTRACT)
    with BuildSketch(Plane(origin=(93.75, 2.7, 0), x_dir=(-1, 0, 0), z_dir=(0, 0, -1))) as chafl_n4_piece_2_section:
        Polygon((1.75, CHAFL_N4_SIZE), (1.75 + CHAFL_N4_SIZE, 0), (1.75, 0), align=None)
    chafl_n4_piece_2 = revolve(axis=Axis((93.75, 2.7, 0), (0, 1, 0)), revolution_arc=90, mode=Mode.PRIVATE)
    chafl_n4_piece_2 = split(chafl_n4_piece_2, bisect_by=Plane(origin=(92, 2.845713539, 1.262575897), z_dir=(1, 0, 0)), keep=Keep.TOP, mode=Mode.PRIVATE)
    chafl_n4_piece_2 = split(chafl_n4_piece_2, bisect_by=Plane(origin=(92.487424103, 2.845713539, 1.75), z_dir=(0, 0, -1)), keep=Keep.TOP, mode=Mode.PRIVATE)
    add(chafl_n4_piece_2, mode=Mode.SUBTRACT)
    with BuildSketch(Plane(origin=(93.75, 2.7, 0), x_dir=(0, 0, 1), z_dir=(-1, 0, 0))) as chafl_n4_piece_3_section:
        Polygon((1.75, CHAFL_N4_SIZE), (1.75 + CHAFL_N4_SIZE, 0), (1.75, 0), align=None)
    chafl_n4_piece_3 = revolve(axis=Axis((93.75, 2.7, 0), (0, 1, 0)), revolution_arc=90, mode=Mode.PRIVATE)
    chafl_n4_piece_3 = split(chafl_n4_piece_3, bisect_by=Plane(origin=(95.5, 2.845713539, 1.262575897), z_dir=(-1, 0, 0)), keep=Keep.TOP, mode=Mode.PRIVATE)
    chafl_n4_piece_3 = split(chafl_n4_piece_3, bisect_by=Plane(origin=(95.012575897, 2.845713539, 1.75), z_dir=(0, 0, -1)), keep=Keep.TOP, mode=Mode.PRIVATE)
    add(chafl_n4_piece_3, mode=Mode.SUBTRACT)
    with BuildSketch(Plane(origin=(93.75, 2.7, 0), x_dir=(-1.5058390090416618e-09, 0, -1.0), z_dir=(1.0, 0, -1.5058390090416618e-09))) as chafl_n4_piece_4_section:
        Polygon((1.75, CHAFL_N4_SIZE), (1.75 + CHAFL_N4_SIZE, 0), (1.75, 0), align=None)
    chafl_n4_piece_4 = revolve(axis=Axis((93.75, 2.7, 0), (0, 1, 0)), revolution_arc=89.999999914, mode=Mode.PRIVATE)
    chafl_n4_piece_4 = split(chafl_n4_piece_4, bisect_by=Plane(origin=(92, 2.845713539, -1.262575897), z_dir=(1, 0, 0)), keep=Keep.TOP, mode=Mode.PRIVATE)
    chafl_n4_piece_4 = split(chafl_n4_piece_4, bisect_by=Plane(origin=(92.487424103, 2.845713539, -1.75), z_dir=(0, 0, 1)), keep=Keep.TOP, mode=Mode.PRIVATE)
    add(chafl_n4_piece_4, mode=Mode.SUBTRACT)


solid = part.part
